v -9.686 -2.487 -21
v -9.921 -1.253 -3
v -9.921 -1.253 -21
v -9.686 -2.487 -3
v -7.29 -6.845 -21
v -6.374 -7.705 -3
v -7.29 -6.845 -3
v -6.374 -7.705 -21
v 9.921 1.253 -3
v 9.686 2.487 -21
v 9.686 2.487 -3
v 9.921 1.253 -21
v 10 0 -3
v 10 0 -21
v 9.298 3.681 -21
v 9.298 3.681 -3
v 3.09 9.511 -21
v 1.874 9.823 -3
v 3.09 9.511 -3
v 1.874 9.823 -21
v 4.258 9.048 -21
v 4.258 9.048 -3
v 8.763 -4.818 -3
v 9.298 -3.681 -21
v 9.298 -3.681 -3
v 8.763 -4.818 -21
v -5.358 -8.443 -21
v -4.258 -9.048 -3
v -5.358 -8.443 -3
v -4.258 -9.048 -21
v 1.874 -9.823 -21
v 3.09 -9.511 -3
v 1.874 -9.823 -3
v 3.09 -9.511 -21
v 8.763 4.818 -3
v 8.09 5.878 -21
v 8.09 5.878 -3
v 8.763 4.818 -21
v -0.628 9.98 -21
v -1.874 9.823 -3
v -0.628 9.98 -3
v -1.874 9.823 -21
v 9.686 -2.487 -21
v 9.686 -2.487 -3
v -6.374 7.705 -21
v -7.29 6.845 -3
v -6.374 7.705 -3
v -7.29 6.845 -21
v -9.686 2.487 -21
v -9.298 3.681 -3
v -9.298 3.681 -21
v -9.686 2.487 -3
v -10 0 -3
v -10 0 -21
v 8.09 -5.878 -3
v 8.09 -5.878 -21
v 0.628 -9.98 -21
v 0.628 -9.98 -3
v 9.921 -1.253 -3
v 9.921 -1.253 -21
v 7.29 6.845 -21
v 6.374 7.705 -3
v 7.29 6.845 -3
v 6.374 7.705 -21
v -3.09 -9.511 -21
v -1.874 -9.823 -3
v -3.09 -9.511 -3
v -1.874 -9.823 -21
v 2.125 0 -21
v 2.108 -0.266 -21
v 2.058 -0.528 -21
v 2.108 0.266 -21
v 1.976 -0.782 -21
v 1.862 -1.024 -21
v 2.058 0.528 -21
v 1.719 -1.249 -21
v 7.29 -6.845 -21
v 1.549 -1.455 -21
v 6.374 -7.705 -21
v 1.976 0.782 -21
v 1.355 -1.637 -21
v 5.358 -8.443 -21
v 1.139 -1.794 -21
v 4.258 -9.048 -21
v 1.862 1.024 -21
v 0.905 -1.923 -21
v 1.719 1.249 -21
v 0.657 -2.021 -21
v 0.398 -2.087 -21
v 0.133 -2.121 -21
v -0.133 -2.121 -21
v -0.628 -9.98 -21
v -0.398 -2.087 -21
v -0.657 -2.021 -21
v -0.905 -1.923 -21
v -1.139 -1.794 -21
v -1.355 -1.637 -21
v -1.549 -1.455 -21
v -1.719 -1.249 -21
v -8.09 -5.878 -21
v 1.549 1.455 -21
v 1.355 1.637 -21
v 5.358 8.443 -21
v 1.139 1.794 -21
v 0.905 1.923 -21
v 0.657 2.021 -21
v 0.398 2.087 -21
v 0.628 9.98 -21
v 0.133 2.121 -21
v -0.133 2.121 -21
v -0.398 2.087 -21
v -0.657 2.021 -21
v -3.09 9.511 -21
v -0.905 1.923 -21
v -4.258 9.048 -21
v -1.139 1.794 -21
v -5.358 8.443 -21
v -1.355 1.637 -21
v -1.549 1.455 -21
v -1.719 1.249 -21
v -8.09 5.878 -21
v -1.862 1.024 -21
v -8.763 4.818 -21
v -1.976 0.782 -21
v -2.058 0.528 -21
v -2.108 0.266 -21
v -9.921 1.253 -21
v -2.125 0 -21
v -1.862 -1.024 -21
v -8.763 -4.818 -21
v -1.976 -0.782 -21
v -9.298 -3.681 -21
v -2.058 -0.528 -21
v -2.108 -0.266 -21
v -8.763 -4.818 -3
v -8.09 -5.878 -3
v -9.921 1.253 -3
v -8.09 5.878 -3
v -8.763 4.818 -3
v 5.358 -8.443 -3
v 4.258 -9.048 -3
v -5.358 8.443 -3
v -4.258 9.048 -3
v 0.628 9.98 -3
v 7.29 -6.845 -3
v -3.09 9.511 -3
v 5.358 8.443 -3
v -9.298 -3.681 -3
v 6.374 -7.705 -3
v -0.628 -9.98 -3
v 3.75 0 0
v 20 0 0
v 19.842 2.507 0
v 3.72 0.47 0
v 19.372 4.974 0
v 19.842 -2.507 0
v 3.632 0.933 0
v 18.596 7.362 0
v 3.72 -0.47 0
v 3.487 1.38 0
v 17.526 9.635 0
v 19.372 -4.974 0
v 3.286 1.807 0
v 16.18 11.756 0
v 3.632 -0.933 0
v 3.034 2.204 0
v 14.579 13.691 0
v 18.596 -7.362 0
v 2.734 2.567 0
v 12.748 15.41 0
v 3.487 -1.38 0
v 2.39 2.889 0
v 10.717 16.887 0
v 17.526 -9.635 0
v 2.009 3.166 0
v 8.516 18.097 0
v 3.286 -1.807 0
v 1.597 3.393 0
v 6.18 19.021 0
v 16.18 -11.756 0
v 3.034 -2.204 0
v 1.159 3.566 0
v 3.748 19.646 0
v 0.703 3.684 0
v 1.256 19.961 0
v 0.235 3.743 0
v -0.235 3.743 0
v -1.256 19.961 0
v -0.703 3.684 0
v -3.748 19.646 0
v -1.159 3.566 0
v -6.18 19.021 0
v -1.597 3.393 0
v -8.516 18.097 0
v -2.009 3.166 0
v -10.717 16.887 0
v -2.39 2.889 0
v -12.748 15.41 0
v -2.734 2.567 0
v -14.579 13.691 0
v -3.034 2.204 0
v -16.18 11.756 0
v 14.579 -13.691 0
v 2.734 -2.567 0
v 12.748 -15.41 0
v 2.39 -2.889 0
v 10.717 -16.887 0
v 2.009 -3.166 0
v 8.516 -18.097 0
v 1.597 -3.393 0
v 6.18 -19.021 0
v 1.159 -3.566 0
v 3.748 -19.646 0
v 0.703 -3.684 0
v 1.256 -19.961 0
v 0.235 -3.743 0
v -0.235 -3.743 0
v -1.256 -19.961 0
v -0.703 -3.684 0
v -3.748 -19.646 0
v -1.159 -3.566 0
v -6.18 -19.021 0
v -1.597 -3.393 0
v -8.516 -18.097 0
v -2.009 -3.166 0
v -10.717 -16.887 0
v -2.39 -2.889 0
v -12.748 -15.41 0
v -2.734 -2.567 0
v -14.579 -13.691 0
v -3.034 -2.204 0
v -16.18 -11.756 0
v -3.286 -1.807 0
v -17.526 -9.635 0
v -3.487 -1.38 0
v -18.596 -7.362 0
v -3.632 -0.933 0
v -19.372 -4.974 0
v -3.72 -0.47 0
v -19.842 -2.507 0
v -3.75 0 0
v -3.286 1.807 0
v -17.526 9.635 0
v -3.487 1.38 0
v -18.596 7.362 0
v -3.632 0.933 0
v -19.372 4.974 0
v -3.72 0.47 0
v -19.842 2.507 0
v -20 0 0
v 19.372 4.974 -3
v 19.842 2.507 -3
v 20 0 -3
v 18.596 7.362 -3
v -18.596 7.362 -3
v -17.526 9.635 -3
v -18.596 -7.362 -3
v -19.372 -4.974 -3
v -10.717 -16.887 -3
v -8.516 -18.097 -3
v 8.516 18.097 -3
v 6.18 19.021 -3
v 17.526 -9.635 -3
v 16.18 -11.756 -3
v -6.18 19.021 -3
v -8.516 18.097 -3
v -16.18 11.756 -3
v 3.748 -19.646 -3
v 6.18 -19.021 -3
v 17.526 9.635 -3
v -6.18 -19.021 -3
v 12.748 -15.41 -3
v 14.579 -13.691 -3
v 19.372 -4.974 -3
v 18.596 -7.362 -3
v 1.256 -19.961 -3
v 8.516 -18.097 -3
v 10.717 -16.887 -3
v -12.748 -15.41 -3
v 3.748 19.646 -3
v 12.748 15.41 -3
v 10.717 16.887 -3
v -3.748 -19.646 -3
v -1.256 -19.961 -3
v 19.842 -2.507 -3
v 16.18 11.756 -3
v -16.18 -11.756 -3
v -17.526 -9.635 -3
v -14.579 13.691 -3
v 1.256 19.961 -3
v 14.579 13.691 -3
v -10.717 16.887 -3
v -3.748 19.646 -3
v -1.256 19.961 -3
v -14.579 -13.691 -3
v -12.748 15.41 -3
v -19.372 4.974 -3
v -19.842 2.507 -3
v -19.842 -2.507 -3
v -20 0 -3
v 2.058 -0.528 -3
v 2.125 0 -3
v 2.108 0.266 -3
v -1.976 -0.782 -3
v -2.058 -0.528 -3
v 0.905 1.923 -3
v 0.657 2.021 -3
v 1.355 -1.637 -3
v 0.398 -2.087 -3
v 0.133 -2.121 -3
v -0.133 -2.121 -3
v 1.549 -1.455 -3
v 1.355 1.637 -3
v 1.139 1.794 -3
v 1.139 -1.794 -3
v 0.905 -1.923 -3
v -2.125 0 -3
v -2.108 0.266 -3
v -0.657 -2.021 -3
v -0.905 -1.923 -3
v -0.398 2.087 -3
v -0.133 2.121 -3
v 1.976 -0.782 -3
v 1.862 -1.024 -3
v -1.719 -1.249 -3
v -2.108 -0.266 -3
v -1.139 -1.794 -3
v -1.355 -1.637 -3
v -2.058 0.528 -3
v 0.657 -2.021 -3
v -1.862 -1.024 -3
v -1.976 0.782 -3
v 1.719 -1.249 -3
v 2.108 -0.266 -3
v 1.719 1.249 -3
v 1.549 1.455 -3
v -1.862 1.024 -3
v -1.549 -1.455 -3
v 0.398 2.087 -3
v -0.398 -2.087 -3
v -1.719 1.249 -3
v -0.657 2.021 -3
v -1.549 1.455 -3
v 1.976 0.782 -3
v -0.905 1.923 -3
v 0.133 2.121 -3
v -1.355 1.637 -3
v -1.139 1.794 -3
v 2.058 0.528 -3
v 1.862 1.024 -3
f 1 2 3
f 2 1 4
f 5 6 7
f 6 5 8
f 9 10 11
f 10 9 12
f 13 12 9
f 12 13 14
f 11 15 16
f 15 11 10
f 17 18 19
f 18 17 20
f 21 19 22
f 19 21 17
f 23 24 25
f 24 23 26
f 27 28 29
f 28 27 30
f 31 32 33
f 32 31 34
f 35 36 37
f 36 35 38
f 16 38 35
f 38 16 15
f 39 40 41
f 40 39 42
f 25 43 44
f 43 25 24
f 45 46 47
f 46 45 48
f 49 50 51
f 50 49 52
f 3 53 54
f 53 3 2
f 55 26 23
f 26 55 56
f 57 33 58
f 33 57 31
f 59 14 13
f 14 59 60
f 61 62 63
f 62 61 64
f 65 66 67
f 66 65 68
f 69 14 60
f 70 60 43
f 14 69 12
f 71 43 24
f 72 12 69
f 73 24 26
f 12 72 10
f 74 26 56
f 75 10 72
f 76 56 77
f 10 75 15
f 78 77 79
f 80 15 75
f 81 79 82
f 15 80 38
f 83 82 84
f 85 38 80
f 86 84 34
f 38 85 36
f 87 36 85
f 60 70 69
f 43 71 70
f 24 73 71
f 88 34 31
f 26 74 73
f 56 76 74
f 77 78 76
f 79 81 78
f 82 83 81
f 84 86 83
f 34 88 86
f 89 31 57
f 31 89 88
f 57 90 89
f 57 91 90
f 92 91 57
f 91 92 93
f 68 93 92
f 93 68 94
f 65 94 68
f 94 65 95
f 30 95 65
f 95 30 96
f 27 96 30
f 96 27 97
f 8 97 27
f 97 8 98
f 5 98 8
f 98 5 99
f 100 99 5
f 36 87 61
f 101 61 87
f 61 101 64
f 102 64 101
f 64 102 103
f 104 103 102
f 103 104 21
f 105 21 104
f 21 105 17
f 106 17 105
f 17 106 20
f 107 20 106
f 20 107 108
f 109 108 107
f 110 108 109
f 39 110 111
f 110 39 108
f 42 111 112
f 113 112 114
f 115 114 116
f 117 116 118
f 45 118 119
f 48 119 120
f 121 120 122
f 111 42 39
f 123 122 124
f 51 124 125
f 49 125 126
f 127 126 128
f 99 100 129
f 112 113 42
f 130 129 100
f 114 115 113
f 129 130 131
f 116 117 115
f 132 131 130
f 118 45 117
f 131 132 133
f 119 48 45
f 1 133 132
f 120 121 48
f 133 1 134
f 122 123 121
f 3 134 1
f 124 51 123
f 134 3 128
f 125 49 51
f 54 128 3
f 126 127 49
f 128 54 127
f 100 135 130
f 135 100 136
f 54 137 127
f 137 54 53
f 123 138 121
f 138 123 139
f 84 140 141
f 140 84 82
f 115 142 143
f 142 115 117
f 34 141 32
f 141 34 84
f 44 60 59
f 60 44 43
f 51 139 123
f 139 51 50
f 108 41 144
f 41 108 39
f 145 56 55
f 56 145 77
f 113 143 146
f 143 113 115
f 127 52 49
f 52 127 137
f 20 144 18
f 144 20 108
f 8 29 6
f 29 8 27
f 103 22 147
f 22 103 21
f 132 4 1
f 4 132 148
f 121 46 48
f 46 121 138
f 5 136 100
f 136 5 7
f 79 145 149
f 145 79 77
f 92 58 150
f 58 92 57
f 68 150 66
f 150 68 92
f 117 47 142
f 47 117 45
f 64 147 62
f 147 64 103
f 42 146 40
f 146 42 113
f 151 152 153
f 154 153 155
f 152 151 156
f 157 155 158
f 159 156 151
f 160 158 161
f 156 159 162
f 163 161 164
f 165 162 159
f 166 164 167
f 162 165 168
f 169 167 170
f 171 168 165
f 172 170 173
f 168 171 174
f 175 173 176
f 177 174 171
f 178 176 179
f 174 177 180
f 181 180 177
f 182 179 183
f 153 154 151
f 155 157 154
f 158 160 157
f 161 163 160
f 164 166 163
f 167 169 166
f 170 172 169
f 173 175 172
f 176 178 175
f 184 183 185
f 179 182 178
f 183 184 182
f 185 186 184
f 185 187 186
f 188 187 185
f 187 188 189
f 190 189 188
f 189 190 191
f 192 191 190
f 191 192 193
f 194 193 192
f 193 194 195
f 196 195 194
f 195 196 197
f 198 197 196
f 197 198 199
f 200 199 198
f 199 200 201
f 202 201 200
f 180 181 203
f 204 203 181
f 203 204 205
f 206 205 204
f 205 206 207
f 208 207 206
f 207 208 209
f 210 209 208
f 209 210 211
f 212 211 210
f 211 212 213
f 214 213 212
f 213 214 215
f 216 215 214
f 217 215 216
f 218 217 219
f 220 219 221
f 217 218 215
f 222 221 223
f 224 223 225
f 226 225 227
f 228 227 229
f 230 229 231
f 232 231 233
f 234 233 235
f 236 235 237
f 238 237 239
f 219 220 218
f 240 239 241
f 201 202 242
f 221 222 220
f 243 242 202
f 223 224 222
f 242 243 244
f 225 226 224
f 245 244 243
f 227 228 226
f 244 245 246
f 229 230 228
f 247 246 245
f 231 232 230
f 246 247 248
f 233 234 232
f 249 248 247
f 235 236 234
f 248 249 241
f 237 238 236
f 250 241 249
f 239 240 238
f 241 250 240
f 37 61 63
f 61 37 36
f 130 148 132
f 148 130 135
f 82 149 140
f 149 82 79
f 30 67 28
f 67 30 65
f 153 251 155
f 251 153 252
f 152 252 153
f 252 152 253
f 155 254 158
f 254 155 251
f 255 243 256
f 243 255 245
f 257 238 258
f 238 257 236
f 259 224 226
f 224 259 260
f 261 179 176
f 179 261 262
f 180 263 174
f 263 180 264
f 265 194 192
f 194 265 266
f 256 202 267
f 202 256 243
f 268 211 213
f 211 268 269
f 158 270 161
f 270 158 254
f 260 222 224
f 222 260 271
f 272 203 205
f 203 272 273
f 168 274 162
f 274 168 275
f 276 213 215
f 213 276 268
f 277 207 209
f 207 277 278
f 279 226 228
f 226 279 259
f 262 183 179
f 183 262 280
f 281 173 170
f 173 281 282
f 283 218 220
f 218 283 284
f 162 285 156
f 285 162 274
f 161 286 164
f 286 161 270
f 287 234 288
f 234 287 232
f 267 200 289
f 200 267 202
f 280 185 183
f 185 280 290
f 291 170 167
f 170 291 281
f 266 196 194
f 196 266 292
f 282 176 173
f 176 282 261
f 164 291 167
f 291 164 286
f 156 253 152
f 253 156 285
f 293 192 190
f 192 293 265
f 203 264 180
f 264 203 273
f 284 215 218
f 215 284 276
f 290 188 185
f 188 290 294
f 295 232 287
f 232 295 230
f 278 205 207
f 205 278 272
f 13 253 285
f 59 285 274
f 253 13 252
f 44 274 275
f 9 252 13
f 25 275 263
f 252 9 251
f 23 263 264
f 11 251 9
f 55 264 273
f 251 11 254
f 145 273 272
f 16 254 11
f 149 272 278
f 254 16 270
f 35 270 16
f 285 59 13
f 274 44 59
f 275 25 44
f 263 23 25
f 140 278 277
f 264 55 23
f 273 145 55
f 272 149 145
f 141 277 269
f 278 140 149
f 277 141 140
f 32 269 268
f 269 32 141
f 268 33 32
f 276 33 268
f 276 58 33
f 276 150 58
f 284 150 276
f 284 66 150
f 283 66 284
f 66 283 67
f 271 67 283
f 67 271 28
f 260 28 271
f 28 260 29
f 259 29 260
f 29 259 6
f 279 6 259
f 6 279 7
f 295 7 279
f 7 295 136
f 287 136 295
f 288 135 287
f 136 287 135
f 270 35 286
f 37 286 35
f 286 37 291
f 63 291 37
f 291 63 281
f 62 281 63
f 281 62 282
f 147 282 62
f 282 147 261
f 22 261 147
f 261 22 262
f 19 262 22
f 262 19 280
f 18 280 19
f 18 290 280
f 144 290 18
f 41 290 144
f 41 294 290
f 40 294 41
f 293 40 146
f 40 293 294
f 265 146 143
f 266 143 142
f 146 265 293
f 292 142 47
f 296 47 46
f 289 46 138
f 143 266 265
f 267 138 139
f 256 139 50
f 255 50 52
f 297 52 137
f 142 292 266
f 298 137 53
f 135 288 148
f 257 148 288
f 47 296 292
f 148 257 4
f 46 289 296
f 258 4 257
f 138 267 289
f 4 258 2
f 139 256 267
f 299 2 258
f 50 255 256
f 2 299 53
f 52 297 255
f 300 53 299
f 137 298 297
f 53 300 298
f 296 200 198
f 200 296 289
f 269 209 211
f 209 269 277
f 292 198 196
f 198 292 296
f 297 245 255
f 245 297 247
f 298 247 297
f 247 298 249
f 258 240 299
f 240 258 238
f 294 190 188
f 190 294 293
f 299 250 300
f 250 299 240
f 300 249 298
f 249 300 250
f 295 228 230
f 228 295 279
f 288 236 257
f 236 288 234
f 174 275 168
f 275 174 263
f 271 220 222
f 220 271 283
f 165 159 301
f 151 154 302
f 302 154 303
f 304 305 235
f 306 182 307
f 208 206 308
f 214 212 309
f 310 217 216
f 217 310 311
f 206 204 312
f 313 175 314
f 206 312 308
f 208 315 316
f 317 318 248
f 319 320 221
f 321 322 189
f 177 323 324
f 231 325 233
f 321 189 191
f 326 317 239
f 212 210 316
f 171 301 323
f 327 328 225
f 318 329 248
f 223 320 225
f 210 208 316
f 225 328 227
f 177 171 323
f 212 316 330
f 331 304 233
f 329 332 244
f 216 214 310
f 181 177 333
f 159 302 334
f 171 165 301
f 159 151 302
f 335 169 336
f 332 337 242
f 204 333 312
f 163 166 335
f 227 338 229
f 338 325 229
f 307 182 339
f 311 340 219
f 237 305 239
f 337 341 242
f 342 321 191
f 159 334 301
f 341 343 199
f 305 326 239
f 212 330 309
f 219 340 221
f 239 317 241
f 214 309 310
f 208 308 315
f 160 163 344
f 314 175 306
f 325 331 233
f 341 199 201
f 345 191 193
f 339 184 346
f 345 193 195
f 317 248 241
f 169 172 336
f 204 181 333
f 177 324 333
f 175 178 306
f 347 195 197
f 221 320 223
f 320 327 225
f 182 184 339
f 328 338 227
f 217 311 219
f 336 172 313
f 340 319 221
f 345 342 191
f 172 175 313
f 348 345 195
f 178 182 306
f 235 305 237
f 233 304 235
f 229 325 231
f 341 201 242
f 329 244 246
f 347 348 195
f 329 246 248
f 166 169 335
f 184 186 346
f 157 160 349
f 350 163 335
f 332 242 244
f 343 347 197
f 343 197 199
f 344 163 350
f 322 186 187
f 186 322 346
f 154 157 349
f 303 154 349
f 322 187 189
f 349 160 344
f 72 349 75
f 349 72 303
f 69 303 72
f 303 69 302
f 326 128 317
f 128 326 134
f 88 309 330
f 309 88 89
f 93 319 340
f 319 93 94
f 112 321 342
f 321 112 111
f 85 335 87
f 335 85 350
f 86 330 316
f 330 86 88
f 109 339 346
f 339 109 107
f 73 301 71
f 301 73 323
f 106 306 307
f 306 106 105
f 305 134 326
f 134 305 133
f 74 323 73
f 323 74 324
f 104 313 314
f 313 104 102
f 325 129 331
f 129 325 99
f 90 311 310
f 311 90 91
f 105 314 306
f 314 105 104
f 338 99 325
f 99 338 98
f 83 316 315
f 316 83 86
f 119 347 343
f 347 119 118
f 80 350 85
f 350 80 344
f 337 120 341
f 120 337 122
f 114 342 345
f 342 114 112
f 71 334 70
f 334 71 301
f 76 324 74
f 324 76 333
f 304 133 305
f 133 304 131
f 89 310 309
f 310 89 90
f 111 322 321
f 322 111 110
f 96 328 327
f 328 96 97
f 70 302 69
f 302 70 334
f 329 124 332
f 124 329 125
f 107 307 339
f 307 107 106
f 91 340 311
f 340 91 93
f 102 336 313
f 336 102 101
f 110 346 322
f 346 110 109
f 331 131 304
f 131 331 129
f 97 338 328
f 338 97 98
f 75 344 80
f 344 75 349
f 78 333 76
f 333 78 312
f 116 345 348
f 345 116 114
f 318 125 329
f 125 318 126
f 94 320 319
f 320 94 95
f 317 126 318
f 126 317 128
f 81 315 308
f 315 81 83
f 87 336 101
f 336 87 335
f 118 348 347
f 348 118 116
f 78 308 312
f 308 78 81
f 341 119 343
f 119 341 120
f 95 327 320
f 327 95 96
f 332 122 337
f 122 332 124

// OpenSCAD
$fn = 50;


difference() {
	union() {
		translate(v = [0, 0, -21.0000000000]) {
			cylinder(h = 21, r = 10.0000000000);
		}
		translate(v = [0, 0, -3.0000000000]) {
			cylinder(h = 3, r = 20.0000000000);
		}
	}
	union() {
		translate(v = [0, 0, 0]) {
			rotate(a = [0, 0, 0]) {
				difference() {
					union() {
						#translate(v = [0, 0, -21.0000000000]) {
							cylinder(h = 21, r = 2.0000000000);
						}
						#translate(v = [0, 0, -3]) {
							cylinder(h = 3, r = 10.0000000000, r1 = 2.1250000000, r2 = 3.7500000000);
						}
						#translate(v = [0, 0, -21.0000000000]) {
							cylinder(h = 21, r = 2.1250000000);
						}
						#translate(v = [0, 0, -21.0000000000]) {
							cylinder(h = 21, r = 2.0000000000);
						}
					}
					union();
				}
			}
		}
	}
}
